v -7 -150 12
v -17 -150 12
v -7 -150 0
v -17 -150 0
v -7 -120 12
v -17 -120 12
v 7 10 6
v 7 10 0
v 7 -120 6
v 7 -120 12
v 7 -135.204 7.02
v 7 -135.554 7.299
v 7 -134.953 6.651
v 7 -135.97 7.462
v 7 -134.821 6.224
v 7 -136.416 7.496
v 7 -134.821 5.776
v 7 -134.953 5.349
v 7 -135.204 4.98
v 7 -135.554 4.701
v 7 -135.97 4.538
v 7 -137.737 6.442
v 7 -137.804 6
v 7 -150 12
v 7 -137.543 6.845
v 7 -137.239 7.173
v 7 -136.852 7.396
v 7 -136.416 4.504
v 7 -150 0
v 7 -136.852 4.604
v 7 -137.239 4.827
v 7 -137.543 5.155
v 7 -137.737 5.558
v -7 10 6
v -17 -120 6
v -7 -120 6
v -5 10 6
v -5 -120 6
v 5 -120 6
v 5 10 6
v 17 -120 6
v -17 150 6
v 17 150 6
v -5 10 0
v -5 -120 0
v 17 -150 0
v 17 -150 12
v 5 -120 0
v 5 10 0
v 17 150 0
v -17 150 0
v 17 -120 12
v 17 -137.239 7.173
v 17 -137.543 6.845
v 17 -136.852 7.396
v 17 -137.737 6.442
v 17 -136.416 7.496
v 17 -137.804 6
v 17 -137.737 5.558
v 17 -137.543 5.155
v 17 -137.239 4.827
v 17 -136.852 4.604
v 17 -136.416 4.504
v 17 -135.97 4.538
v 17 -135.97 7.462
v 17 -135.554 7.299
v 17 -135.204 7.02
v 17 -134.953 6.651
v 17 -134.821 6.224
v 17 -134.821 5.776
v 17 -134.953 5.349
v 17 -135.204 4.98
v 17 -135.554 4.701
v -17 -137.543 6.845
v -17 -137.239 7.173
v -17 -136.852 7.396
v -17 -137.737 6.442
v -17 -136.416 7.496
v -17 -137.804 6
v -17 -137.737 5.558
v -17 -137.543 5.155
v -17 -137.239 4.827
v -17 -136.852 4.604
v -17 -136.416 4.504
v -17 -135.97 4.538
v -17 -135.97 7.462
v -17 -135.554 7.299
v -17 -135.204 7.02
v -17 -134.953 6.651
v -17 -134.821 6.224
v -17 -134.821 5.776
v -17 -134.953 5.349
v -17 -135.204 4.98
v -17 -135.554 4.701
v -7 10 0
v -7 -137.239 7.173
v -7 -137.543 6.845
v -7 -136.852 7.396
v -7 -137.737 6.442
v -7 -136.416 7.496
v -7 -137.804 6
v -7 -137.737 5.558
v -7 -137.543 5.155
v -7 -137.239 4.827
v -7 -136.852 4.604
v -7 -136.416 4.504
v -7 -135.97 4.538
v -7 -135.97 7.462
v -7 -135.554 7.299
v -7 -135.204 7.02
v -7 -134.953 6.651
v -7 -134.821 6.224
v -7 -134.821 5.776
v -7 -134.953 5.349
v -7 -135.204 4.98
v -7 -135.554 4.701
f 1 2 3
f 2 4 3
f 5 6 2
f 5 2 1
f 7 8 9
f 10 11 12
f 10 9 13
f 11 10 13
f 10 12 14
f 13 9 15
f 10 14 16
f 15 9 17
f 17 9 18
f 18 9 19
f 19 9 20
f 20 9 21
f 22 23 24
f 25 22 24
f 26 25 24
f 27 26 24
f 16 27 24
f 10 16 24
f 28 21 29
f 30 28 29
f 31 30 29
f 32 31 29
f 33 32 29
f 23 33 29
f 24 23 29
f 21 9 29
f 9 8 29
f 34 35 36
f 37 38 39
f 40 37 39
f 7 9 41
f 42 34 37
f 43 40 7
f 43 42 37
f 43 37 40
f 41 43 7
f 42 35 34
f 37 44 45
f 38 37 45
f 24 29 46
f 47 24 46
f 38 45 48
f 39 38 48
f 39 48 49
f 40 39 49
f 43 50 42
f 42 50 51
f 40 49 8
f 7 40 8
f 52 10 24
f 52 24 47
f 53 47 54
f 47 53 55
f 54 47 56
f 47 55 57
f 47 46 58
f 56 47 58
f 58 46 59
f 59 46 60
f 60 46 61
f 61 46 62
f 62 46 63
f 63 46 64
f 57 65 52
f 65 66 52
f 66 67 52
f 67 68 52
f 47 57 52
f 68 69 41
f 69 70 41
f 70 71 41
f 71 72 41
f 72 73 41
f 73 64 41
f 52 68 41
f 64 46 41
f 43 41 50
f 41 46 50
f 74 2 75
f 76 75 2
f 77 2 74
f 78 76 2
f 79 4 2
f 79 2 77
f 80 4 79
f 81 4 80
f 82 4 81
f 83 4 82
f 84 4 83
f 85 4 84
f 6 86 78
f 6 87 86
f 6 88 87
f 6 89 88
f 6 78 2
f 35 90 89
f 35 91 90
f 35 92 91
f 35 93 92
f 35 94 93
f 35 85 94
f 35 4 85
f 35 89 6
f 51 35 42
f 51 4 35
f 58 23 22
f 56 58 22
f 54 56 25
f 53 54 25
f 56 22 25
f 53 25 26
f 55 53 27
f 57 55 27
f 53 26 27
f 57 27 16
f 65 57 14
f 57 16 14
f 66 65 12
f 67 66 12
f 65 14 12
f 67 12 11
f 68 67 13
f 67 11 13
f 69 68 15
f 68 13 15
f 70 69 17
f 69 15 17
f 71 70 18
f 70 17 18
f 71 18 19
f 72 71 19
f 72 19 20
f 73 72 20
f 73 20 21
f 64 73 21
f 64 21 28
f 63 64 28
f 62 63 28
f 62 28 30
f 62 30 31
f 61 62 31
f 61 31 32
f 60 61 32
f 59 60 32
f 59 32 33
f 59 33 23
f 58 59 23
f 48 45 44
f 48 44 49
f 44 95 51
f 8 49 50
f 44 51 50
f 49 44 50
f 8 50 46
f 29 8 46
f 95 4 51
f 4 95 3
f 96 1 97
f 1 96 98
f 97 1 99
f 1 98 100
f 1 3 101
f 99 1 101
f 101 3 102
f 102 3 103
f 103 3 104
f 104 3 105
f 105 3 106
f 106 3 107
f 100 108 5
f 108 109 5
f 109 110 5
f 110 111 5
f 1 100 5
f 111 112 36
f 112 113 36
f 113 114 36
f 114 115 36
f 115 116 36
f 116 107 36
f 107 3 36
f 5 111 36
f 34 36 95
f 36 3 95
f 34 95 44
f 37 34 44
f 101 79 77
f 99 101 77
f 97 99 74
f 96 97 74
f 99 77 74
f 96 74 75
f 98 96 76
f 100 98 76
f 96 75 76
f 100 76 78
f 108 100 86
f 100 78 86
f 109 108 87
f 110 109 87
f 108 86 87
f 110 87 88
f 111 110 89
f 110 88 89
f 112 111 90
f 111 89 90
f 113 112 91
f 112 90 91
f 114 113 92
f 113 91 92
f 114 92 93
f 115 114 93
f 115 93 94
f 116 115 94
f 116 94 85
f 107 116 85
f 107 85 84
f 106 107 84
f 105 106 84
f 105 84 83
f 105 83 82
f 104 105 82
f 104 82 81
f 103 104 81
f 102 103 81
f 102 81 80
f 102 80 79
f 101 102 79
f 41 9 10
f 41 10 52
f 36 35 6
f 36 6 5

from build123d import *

# Parameters (mm, degrees)
F1_DEPTH = 6
F2_W     = 10
F2_H     = 30
F3_DEPTH = 6
F4_R     = 1.5
F5_DEPTH = 34.001


with BuildPart() as f1:
    # F0 (on Top) → F1 (new body)
    with BuildSketch(Plane.XY):
        Polygon((7, -150), (17, -150), (17, 150), (-17, 150), (-17, -150), (-7, -150), (-7, 10), (-5, 10), (-5, -120), (5, -120), (5, 10), (7, 10), align=None)
    extrude(amount=F1_DEPTH)

    # F2 (on face) → F3 (join)
    with BuildSketch(Plane.XY.offset(6)):
        with Locations((-12, -135)):
            Rectangle(F2_W, F2_H)
        with Locations((12, -135)):
            Rectangle(F2_W, F2_H)
    extrude(amount=F3_DEPTH)

    # F4 (on face) → F5 (cut, through all)
    with BuildSketch(Plane(origin=(-17, 0, 0), x_dir=(0, -1, 0), z_dir=(-1, 0, 0))):
        with Locations((136.304066, 6)):
            Circle(F4_R)
    extrude(amount=-F5_DEPTH, mode=Mode.SUBTRACT)


solid = f1.part
